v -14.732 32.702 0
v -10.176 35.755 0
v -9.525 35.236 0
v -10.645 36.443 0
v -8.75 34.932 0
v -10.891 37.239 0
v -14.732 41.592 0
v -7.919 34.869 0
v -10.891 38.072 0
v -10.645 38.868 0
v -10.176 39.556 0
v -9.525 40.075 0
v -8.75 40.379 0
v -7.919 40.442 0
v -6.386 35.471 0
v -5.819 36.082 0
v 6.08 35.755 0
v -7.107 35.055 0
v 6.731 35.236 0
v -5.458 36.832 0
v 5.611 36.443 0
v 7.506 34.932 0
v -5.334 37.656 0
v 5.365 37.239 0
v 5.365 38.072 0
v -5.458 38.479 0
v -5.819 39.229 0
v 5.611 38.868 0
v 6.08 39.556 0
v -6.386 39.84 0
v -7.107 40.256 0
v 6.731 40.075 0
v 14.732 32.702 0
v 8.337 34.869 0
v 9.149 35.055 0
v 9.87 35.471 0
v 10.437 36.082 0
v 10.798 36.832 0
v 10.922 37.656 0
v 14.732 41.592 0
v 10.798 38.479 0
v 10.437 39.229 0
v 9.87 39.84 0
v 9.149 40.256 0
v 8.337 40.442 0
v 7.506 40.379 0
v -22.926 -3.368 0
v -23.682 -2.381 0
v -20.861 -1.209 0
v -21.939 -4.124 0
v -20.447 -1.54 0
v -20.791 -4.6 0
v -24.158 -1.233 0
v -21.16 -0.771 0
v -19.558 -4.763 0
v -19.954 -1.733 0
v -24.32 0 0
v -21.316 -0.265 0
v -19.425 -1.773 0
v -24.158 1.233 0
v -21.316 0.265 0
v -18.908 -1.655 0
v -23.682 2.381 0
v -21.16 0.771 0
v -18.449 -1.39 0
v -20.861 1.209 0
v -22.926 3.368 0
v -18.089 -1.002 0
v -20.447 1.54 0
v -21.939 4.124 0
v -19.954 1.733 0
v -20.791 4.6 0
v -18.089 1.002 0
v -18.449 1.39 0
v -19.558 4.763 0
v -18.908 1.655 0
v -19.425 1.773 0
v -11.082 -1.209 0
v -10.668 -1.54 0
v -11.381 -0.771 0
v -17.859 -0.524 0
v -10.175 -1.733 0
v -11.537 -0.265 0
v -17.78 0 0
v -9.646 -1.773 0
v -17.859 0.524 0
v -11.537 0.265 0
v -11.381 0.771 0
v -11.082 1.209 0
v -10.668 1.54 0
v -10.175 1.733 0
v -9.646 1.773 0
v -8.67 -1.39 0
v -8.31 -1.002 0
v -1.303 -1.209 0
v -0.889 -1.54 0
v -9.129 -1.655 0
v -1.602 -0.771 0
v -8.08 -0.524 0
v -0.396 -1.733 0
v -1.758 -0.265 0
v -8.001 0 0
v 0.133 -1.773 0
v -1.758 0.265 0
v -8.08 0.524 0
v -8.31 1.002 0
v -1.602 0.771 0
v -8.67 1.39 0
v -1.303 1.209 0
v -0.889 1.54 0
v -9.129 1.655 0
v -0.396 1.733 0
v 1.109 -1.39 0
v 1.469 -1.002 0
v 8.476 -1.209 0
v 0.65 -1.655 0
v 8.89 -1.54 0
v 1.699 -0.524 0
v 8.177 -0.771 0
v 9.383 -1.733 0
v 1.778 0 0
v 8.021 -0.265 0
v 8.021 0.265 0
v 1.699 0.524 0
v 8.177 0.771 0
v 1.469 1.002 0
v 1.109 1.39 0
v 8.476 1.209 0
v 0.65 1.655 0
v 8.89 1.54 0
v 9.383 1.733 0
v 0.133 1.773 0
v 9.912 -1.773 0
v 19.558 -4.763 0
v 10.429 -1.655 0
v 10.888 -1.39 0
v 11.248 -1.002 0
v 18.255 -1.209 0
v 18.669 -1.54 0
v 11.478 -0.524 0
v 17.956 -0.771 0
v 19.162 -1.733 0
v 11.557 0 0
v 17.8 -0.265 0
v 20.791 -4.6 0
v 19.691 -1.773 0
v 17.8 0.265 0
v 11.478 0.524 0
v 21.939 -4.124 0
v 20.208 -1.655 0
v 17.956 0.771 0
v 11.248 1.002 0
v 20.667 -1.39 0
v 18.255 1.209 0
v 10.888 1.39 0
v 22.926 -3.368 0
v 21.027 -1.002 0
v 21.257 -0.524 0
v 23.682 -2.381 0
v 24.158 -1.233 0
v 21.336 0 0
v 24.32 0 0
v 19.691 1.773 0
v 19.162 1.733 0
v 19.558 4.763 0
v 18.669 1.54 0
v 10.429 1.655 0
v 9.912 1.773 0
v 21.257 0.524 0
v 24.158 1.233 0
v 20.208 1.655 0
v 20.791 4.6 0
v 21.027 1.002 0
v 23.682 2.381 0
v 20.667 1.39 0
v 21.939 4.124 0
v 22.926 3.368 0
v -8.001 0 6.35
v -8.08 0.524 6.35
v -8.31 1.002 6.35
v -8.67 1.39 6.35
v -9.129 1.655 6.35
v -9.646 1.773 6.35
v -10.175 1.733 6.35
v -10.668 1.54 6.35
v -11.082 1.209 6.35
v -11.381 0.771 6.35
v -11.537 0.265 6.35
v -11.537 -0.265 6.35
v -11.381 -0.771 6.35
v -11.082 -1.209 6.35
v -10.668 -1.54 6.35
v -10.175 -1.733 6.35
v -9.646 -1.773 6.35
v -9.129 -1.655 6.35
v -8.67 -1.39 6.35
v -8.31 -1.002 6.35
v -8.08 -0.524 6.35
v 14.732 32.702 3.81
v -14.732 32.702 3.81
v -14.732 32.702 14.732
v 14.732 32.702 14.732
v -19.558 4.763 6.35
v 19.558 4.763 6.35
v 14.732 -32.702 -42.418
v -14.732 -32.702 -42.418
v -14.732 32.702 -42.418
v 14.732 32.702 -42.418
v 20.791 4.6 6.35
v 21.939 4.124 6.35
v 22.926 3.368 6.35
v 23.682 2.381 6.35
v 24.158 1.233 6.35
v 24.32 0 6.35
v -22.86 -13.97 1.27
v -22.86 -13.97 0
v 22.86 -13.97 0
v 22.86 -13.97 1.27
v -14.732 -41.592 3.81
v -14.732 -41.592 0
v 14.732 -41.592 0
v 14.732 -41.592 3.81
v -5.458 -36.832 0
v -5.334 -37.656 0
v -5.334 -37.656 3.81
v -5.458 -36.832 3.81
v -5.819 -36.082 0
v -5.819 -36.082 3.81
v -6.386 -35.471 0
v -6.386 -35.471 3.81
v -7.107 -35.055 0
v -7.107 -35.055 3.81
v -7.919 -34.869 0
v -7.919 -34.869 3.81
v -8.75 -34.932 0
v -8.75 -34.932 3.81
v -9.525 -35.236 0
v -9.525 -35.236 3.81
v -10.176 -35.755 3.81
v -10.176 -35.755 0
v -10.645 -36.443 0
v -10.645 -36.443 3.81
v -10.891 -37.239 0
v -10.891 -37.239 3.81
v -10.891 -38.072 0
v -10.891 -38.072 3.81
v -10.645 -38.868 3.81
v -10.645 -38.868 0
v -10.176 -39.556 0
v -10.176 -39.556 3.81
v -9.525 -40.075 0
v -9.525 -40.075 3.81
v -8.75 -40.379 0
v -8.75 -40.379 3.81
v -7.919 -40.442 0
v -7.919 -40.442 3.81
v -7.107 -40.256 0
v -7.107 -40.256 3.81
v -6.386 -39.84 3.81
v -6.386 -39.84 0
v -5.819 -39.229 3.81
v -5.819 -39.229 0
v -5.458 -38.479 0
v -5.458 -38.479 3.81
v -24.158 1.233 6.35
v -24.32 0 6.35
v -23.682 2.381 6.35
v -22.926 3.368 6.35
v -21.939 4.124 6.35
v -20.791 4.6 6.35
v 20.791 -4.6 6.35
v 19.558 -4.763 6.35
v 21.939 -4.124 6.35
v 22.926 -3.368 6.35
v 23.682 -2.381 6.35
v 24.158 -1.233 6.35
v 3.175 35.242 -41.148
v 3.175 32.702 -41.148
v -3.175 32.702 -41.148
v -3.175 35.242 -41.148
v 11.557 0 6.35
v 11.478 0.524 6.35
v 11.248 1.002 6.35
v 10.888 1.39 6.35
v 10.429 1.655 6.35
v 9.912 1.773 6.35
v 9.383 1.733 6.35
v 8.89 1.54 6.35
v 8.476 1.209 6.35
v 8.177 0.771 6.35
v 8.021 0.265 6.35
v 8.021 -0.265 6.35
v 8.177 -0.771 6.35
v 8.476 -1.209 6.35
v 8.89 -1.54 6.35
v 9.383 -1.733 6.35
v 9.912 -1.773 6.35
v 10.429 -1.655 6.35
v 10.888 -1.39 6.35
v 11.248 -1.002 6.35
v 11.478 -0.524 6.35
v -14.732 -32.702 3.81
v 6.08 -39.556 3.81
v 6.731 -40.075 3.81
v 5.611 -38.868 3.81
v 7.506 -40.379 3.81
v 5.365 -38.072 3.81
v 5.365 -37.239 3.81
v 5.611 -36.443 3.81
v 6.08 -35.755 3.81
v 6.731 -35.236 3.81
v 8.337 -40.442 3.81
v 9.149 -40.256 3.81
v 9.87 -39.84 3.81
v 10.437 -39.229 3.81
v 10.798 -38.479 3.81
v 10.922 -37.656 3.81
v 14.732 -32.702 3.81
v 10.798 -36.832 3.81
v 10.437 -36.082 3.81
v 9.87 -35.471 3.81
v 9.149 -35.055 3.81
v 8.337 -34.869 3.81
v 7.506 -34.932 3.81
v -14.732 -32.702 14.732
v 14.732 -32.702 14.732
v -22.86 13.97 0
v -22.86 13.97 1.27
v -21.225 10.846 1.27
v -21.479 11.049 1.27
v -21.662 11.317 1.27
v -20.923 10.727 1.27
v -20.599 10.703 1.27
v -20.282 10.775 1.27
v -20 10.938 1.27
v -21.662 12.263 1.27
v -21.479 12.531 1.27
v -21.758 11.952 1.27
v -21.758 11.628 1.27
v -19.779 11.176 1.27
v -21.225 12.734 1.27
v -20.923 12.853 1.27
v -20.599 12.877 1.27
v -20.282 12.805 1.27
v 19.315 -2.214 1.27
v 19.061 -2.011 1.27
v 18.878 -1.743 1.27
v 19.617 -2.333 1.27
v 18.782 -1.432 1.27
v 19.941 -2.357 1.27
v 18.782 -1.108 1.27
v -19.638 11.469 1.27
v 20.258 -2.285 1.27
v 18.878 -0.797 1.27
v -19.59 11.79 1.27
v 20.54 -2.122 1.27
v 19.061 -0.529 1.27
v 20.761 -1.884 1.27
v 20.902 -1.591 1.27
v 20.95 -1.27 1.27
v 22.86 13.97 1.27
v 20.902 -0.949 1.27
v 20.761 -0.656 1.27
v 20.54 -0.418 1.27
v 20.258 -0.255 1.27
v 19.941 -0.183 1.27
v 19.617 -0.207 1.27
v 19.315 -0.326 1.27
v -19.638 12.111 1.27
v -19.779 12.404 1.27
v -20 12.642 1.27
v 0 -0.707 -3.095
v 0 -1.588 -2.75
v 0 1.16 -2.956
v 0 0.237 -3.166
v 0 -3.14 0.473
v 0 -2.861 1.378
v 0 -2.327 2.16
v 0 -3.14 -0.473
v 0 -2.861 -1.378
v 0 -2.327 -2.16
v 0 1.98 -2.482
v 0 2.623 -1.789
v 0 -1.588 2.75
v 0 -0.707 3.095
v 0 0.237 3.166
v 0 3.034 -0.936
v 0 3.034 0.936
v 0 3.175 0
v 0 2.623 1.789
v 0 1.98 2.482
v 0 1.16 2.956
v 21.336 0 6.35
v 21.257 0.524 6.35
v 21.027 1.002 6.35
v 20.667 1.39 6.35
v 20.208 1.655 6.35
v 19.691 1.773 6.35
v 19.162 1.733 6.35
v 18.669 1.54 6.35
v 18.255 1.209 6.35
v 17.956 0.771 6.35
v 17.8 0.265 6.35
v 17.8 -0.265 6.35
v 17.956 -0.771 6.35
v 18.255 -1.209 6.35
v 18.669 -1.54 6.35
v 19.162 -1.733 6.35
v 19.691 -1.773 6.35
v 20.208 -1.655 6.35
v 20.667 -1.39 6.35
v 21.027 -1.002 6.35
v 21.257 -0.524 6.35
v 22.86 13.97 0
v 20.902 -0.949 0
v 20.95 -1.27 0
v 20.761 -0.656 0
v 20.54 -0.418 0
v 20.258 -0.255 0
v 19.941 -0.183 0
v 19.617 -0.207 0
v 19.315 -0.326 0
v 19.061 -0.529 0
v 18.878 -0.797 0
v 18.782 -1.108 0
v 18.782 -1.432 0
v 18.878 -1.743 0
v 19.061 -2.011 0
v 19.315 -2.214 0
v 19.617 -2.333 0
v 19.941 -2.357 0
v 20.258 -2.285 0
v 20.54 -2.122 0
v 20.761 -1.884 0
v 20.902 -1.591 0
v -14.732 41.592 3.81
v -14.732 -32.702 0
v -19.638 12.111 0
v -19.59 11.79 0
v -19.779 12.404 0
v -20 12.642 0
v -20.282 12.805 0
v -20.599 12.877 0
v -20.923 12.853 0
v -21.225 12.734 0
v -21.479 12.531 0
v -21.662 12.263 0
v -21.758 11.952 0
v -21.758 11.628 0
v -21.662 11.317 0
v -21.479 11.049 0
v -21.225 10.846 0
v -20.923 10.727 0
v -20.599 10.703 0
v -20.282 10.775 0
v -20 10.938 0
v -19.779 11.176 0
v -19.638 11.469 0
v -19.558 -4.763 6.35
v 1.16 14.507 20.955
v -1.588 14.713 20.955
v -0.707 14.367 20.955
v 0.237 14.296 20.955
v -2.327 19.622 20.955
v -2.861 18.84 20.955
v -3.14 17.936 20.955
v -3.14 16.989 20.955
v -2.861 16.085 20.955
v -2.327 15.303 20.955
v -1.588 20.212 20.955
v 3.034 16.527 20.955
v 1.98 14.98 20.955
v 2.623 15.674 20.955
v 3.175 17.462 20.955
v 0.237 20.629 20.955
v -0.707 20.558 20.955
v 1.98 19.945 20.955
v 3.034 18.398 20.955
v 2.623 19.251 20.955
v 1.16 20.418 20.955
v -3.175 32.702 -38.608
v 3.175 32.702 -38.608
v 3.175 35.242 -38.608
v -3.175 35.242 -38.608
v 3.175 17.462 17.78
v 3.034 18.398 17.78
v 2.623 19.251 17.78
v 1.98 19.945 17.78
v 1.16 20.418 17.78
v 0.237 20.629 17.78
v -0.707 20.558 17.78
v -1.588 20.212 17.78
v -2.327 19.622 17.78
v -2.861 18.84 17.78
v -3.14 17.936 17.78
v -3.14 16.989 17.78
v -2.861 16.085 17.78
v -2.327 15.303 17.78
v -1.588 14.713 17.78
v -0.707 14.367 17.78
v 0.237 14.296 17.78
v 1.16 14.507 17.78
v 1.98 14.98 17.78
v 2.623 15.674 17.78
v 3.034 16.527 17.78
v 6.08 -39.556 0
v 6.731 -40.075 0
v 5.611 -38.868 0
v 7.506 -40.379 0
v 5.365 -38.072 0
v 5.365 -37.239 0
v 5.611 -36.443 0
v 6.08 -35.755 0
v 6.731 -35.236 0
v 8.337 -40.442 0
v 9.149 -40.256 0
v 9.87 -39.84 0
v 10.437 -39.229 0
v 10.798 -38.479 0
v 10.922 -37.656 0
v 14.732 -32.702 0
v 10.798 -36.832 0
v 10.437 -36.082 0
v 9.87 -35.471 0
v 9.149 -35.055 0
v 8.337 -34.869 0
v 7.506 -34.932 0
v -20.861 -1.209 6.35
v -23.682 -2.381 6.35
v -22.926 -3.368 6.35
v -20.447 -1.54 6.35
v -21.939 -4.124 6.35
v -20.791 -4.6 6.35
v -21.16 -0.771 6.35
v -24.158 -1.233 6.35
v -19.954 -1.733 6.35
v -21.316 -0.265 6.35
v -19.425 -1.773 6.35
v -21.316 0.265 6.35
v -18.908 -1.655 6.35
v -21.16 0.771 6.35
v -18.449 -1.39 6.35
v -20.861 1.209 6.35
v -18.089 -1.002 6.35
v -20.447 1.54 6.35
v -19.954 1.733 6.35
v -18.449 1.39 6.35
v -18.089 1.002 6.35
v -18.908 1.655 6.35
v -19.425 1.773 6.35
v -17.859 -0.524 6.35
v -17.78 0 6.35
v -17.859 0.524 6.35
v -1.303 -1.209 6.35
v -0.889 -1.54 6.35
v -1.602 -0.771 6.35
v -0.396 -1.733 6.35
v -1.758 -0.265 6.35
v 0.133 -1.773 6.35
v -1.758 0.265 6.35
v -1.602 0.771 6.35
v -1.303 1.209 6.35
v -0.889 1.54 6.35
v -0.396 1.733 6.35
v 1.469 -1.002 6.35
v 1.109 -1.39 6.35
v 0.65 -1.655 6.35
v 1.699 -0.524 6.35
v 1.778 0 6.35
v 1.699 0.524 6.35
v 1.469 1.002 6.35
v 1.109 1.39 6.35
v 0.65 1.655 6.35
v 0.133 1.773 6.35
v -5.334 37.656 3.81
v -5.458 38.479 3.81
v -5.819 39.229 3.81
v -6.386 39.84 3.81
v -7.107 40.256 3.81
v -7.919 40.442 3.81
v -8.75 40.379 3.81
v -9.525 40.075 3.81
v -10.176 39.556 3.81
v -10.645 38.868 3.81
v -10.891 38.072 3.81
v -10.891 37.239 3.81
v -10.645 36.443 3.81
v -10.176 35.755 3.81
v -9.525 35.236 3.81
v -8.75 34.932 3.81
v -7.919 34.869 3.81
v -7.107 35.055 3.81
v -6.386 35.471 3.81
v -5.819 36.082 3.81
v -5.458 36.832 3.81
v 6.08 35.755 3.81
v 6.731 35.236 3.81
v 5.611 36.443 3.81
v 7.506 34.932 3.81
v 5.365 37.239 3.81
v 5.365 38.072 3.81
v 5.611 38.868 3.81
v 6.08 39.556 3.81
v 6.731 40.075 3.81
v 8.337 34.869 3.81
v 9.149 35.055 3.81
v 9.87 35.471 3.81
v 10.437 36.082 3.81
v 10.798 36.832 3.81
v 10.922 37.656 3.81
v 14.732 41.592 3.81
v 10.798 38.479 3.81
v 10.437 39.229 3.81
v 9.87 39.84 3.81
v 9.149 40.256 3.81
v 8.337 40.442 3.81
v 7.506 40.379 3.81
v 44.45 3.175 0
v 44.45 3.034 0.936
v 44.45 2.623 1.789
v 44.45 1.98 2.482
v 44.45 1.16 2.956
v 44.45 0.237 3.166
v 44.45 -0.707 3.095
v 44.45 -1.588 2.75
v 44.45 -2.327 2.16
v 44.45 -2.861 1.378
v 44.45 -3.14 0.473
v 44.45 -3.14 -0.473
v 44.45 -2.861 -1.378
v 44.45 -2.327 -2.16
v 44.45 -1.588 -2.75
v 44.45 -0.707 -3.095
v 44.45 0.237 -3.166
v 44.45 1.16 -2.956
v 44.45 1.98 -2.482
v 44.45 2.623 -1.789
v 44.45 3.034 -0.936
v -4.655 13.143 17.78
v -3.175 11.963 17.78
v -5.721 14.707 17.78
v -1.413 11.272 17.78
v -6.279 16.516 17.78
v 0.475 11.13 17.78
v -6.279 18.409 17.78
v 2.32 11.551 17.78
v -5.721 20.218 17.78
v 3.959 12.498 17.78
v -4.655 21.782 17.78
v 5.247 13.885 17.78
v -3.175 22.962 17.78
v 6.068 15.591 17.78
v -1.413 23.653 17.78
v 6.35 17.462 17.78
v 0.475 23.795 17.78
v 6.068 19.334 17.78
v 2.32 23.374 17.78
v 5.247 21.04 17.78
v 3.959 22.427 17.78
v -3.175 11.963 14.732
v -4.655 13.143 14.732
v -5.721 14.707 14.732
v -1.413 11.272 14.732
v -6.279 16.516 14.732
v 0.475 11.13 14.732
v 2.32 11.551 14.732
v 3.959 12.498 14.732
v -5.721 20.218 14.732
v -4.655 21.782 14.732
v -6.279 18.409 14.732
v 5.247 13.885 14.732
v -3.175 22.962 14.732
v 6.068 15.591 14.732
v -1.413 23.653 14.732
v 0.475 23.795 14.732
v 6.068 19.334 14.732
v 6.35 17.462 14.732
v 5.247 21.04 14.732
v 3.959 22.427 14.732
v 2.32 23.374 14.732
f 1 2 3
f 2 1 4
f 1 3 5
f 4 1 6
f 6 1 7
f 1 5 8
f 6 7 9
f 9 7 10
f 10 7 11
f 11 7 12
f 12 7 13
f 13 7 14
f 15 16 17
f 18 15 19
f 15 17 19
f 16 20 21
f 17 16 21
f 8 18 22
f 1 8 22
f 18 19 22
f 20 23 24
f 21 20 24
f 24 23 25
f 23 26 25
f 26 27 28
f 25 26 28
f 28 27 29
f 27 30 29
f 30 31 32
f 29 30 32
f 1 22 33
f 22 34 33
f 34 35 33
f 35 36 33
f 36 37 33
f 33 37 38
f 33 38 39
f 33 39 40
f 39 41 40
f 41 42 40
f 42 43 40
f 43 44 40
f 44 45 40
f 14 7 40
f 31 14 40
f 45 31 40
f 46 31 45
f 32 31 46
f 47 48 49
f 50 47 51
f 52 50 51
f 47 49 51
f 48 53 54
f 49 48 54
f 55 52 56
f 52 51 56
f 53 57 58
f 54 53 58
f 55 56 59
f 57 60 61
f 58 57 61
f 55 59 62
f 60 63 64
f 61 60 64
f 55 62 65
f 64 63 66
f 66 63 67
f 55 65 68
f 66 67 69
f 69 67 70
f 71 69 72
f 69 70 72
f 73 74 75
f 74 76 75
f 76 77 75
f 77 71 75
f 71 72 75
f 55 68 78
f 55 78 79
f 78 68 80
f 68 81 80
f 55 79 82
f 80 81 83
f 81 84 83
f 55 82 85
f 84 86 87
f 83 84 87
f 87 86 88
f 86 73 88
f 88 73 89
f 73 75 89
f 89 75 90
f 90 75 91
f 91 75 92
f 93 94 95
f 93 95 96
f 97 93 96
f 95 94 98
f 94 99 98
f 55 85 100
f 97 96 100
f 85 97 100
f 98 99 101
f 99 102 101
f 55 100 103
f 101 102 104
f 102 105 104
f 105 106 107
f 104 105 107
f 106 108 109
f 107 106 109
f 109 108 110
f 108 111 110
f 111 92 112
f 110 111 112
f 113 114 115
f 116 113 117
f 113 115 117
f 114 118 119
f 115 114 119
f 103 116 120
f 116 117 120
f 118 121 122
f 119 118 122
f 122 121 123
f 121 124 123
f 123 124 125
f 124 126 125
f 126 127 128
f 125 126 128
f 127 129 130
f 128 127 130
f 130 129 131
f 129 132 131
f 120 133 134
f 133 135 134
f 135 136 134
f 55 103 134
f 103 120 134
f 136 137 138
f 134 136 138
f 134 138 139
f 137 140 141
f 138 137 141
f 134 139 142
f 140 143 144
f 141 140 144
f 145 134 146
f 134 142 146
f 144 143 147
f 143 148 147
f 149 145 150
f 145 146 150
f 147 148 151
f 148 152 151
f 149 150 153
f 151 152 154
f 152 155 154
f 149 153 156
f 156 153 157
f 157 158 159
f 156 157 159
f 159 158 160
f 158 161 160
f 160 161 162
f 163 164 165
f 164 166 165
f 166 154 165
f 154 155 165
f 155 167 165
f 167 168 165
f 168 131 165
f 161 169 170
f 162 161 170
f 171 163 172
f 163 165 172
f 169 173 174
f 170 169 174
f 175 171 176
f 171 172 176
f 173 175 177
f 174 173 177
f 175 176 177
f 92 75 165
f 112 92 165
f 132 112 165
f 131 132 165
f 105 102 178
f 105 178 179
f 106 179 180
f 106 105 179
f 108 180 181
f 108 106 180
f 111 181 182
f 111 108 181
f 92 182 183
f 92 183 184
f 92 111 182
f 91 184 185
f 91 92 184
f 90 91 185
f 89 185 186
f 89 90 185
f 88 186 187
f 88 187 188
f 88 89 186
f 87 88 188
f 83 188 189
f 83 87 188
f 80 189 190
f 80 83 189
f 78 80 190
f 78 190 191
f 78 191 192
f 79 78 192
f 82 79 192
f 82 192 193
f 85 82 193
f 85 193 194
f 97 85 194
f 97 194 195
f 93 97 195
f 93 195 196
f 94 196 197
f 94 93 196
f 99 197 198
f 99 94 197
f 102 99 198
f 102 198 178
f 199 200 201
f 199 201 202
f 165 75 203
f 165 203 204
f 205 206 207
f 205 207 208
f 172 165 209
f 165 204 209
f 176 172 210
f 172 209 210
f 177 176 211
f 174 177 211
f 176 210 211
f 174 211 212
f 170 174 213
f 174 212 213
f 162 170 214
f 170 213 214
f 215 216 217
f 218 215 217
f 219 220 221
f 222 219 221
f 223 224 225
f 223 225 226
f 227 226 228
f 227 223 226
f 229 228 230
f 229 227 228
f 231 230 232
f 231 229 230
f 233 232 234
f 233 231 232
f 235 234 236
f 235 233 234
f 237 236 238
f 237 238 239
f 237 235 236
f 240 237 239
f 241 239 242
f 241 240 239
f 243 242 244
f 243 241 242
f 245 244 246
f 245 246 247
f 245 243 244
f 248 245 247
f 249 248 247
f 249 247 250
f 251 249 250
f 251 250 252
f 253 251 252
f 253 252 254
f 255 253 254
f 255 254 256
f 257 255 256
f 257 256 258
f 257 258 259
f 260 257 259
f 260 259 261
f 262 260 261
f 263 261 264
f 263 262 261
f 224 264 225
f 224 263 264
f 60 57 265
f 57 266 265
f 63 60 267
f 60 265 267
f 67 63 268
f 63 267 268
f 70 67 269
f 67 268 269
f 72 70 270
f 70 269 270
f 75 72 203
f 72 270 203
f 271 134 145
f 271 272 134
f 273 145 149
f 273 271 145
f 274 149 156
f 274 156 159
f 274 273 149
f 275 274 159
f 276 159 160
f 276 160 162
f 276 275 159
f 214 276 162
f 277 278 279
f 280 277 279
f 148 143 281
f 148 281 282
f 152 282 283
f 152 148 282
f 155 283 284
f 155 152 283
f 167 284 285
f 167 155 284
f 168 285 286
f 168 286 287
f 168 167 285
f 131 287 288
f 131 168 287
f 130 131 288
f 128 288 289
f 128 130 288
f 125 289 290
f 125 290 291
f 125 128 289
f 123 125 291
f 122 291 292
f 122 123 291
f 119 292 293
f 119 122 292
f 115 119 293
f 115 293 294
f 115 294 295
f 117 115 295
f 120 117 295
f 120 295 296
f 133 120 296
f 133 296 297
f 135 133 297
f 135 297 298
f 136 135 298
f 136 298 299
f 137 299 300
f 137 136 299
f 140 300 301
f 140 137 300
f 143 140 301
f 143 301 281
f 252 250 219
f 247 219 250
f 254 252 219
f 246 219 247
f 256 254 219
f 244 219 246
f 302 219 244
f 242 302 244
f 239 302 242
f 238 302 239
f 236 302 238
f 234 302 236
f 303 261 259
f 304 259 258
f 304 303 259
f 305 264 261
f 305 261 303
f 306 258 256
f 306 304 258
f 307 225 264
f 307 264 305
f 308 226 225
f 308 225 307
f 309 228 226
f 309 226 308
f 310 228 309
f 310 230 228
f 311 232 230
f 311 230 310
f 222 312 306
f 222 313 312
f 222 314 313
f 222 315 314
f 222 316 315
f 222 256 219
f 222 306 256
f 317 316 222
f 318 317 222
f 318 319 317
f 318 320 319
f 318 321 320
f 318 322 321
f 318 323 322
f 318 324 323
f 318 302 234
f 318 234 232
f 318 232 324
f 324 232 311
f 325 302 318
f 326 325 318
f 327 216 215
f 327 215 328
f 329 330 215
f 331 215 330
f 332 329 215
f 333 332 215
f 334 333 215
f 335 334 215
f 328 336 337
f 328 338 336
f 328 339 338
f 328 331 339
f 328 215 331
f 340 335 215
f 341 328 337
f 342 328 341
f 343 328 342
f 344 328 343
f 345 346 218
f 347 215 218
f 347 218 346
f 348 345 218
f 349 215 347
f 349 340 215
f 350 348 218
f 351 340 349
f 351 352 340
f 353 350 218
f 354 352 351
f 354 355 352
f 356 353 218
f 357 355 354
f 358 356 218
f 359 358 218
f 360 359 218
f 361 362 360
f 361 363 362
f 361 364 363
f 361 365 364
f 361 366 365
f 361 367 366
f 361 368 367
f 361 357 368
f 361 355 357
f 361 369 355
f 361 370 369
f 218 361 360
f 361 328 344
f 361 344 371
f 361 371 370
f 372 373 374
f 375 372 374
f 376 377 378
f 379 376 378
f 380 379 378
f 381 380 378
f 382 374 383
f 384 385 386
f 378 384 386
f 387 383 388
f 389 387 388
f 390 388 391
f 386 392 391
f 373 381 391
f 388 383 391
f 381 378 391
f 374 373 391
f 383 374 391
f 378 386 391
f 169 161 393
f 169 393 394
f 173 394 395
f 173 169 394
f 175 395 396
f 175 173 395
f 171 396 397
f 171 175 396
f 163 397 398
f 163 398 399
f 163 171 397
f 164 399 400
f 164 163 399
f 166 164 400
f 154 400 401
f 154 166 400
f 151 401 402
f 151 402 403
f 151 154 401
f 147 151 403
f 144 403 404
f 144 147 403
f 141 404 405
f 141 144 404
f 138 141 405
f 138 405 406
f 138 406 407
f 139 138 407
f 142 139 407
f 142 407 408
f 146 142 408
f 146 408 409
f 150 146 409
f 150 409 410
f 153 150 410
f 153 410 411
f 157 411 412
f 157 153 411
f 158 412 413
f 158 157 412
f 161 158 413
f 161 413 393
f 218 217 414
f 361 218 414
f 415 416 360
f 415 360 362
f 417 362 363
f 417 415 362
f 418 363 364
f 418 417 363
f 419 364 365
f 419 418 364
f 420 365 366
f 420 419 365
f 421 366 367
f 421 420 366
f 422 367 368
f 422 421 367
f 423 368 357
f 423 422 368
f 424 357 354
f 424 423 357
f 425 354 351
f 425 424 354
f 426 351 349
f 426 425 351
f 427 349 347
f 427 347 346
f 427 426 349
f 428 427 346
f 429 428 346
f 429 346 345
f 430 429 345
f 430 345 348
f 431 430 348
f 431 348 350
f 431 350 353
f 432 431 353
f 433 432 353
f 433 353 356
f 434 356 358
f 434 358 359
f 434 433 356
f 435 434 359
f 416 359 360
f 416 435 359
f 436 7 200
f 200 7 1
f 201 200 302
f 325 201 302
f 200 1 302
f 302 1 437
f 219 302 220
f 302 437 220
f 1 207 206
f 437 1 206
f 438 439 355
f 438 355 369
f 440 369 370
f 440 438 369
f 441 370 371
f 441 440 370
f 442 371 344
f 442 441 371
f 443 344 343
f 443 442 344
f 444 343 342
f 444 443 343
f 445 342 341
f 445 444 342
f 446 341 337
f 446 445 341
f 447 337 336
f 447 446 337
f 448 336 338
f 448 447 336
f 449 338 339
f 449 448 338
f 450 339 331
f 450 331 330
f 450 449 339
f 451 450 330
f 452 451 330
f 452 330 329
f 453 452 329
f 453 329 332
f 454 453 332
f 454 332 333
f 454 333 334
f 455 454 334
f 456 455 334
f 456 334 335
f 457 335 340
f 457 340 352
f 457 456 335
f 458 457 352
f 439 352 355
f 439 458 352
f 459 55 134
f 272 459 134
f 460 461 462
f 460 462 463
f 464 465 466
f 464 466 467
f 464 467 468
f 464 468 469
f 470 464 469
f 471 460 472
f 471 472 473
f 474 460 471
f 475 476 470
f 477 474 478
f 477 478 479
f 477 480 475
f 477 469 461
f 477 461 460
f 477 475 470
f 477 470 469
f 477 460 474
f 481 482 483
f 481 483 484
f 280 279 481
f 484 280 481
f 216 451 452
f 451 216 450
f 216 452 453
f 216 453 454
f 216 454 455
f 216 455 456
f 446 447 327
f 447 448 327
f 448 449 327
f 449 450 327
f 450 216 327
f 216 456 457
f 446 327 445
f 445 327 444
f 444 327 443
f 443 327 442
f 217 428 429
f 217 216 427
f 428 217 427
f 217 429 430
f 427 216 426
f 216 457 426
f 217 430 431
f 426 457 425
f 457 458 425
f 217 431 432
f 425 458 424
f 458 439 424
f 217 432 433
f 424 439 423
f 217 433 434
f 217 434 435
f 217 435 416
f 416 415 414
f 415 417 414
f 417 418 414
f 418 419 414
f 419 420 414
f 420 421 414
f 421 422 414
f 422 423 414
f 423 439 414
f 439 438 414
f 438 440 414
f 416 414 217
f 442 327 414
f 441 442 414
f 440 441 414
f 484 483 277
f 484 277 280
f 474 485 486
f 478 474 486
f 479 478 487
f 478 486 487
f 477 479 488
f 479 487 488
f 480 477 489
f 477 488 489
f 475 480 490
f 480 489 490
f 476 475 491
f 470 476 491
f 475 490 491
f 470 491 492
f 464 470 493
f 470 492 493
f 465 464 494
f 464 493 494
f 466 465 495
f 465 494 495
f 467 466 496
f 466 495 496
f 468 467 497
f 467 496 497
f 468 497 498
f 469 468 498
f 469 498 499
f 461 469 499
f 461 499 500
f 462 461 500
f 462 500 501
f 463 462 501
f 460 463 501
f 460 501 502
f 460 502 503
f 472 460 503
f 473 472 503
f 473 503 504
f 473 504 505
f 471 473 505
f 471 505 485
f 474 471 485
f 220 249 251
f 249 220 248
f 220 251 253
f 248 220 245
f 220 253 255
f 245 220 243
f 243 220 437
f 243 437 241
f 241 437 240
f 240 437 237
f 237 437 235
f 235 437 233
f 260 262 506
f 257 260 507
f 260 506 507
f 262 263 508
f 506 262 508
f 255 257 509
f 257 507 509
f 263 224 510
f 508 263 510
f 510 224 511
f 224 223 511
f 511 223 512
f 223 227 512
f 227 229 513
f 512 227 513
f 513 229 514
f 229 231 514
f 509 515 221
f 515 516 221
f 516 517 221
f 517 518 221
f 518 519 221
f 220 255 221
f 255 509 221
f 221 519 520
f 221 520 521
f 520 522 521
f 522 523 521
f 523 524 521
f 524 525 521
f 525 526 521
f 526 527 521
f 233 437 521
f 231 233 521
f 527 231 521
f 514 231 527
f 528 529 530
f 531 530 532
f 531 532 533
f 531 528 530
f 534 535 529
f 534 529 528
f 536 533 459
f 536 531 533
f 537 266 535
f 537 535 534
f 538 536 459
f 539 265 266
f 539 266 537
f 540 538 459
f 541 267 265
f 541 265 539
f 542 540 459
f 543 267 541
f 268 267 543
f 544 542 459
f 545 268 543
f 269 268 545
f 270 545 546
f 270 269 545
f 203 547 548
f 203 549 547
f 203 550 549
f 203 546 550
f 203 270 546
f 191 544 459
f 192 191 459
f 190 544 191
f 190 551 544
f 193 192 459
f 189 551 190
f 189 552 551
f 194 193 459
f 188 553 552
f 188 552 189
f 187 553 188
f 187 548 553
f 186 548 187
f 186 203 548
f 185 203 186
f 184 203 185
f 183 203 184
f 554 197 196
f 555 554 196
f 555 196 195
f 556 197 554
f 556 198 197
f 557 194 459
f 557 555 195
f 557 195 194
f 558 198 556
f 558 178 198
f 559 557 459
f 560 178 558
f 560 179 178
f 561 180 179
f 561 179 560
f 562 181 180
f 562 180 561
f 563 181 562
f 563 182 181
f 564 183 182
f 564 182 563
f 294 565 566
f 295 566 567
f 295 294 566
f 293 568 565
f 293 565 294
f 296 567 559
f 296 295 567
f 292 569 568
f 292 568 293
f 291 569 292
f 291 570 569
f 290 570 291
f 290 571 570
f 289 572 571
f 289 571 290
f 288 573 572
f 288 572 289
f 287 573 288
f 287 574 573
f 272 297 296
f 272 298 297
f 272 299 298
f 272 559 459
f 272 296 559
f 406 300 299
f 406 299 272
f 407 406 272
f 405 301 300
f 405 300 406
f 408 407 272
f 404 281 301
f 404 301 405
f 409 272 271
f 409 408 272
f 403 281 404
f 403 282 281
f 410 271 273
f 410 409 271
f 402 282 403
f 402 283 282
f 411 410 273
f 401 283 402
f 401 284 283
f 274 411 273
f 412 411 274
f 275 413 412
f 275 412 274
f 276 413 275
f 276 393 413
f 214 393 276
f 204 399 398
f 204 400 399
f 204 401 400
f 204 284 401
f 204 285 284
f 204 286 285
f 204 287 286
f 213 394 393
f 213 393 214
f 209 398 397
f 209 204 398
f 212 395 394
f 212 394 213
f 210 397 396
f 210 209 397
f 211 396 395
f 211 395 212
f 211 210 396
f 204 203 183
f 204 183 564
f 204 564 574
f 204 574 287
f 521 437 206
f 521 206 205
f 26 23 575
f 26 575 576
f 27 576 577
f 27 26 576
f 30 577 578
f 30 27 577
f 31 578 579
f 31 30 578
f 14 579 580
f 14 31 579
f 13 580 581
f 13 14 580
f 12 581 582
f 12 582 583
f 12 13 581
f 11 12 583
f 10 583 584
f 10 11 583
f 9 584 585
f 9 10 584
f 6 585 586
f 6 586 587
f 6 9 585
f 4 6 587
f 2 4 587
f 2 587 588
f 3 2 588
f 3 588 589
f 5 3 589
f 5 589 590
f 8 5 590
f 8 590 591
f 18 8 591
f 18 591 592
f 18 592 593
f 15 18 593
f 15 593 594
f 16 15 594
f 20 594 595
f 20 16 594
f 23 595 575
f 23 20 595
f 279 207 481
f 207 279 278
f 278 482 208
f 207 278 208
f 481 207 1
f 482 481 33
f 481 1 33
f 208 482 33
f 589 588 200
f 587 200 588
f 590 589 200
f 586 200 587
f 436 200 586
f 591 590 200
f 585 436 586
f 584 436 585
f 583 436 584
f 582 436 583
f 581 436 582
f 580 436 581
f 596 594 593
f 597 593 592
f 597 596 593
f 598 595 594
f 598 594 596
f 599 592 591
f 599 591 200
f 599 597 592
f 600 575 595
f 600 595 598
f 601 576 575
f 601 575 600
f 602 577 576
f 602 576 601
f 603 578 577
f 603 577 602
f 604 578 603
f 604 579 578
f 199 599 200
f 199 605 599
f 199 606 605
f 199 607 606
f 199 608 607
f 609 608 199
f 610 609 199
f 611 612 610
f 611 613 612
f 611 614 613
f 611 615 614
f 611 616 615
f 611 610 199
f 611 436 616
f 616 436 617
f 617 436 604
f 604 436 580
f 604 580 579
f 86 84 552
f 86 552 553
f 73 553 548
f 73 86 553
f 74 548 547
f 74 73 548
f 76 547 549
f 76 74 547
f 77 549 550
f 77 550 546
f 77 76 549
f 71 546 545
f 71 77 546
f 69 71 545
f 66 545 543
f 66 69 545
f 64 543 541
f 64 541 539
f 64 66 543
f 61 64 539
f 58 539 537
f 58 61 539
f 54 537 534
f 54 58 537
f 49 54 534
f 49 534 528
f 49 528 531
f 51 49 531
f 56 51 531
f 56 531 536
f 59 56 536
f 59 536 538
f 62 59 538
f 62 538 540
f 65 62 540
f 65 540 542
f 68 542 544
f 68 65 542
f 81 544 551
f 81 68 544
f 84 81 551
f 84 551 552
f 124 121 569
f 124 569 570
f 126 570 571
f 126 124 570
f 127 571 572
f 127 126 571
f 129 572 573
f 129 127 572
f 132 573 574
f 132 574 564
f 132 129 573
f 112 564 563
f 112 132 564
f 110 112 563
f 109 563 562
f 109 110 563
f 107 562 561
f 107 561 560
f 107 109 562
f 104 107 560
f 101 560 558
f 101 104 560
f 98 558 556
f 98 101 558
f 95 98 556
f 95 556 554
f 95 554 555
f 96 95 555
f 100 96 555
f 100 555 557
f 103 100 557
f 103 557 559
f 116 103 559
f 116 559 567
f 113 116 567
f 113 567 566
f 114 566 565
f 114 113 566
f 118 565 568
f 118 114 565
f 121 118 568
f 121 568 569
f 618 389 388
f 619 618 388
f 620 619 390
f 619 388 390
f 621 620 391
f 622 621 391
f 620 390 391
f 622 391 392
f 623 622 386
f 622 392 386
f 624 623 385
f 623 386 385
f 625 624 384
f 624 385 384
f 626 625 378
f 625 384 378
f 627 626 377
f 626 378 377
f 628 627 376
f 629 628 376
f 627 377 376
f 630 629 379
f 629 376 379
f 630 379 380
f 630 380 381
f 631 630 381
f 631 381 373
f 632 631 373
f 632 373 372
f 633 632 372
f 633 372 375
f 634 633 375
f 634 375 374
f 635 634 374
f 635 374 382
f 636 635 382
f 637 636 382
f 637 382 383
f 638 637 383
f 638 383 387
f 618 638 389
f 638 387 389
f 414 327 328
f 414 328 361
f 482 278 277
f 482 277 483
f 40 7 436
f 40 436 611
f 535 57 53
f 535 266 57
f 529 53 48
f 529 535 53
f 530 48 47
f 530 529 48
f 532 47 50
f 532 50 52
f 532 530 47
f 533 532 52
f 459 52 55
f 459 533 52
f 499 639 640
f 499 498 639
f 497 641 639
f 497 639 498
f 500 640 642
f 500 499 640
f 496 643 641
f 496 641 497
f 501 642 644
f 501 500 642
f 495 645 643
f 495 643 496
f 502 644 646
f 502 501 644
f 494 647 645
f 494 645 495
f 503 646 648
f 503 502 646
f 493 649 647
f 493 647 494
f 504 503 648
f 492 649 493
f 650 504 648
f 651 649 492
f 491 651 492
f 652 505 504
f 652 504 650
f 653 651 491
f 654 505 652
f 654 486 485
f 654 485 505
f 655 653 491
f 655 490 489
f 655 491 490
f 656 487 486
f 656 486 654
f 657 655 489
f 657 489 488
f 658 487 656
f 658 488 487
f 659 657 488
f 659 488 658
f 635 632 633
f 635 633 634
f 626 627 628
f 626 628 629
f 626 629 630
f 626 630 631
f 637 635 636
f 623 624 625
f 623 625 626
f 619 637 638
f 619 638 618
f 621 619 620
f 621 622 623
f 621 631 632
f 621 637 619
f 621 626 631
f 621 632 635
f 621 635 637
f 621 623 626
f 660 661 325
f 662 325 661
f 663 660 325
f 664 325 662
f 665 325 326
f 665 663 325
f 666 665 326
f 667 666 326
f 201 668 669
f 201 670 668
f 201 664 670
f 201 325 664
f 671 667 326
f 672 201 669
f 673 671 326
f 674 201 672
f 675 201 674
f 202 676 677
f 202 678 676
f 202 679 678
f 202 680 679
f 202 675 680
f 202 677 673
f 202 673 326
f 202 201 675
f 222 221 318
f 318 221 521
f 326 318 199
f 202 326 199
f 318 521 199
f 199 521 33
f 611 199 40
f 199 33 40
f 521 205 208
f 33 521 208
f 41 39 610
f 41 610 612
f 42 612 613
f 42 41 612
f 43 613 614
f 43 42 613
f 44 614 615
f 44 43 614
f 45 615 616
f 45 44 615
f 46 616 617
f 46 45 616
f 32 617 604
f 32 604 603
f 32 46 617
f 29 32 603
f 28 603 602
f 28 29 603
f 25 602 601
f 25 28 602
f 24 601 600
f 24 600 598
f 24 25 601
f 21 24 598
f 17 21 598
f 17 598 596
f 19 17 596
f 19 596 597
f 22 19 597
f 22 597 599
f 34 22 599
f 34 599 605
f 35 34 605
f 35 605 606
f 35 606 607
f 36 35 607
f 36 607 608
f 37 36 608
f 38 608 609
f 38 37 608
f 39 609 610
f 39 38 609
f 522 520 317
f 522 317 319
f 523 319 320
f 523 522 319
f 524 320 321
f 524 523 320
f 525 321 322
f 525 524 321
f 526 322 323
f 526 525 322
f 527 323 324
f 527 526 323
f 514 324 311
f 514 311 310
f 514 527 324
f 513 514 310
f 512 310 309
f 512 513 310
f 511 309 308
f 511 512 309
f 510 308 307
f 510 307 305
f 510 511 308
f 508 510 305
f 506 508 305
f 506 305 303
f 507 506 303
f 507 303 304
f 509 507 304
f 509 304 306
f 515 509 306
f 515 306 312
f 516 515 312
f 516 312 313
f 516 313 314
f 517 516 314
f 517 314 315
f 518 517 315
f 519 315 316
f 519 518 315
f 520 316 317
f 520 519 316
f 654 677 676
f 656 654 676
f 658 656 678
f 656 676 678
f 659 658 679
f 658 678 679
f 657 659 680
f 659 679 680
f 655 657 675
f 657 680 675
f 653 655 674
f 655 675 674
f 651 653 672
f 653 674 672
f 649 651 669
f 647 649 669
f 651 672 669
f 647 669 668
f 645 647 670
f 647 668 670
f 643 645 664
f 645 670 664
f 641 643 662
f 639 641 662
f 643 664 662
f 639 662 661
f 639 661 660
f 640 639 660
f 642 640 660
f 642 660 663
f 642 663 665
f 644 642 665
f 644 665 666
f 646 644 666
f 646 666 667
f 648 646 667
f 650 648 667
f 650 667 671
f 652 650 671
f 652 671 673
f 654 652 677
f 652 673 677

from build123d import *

# Parameters (mm, degrees)
F0_W      = 45.72
F0_H      = 27.94
F0_R      = 1.09
F1_DEPTH  = 1.27
F2_W      = 29.464
F2_H      = 8.89
F2_R      = 2.794
F2_H_2    = 65.405
F3_DEPTH  = 3.81
F4_DEPTH  = 14.732
F5_DEPTH  = 42.418
F6_R      = 3.175
F7_DEPTH  = 6.223
F6_R_2    = 6.35
F8_DEPTH  = 3.048
F9_W      = 6.35
F9_H      = 2.54
F10_DEPTH = 2.54
F11_R     = 3.175
F12_DEPTH = 44.45
F13_W     = 48.641
F13_H     = 9.525
F13_R     = 1.778
F14_DEPTH = 6.35
F15_R     = 4.76249


# Not quite as in the source:
# - a fillet or chamfer is up to 0.001 mm smaller than in the source, because OpenCascade refuses the exact size


with BuildPart() as f1:
    # F0 (on Top) → F1 (new body)
    with BuildSketch(Plane.XY):
        Rectangle(F0_W, F0_H)
        with Locations((19.86, -1.27)):
            Circle(F0_R, mode=Mode.SUBTRACT)
        with Locations((-20.68, 11.79)):
            Circle(F0_R, mode=Mode.SUBTRACT)
    extrude(amount=F1_DEPTH)


with BuildPart() as f3:
    # F2 (on Top) → F3 (new body)
    with BuildSketch(Plane.XY):
        with Locations((0, 37.1475)):
            Rectangle(F2_W, F2_H)
        with Locations((-8.128, 37.6555)):
            Circle(F2_R, mode=Mode.SUBTRACT)
        with Locations((8.128, 37.6555)):
            Circle(F2_R, mode=Mode.SUBTRACT)
        Rectangle(F2_W, F2_H_2)
        with Locations((0, -37.1475)):
            Rectangle(F2_W, F2_H)
        with Locations((-8.128, -37.6555)):
            Circle(F2_R, mode=Mode.SUBTRACT)
        with Locations((8.128, -37.6555)):
            Circle(F2_R, mode=Mode.SUBTRACT)
    extrude(amount=F3_DEPTH)

    # F2 (on Top) → F4 (join)
    with BuildSketch(Plane.XY):
        Rectangle(F2_W, F2_H_2)
    extrude(amount=F4_DEPTH)

    # F2 (on Top) → F5 (join)
    with BuildSketch(Plane.XY):
        Rectangle(F2_W, F2_H_2)
    extrude(amount=-F5_DEPTH)

    # F6 (on face) → F7 (join)
    with BuildSketch(Plane.XY.offset(14.732)):
        with Locations((0, 17.4625)):
            Circle(F6_R)
    extrude(amount=F7_DEPTH)

    # F6 (on face) → F8 (join)
    with BuildSketch(Plane.XY.offset(14.732)):
        with Locations((0, 17.4625)):
            Circle(F6_R_2)
        with Locations((0, 17.4625)):
            Circle(F6_R, mode=Mode.SUBTRACT)
    extrude(amount=F8_DEPTH)

    # F9 (on face) → F10 (join)
    with BuildSketch(Plane(origin=(0, 32.7025, 0), x_dir=(-1, 0, 0), z_dir=(0, 1, 0))):
        with Locations((0, -39.878)):
            Rectangle(F9_W, F9_H)
    extrude(amount=F10_DEPTH)


with BuildPart() as f12:
    # F11 (on Right) → F12 (new body)
    with BuildSketch(Plane.YZ):
        Circle(F11_R)
    extrude(amount=F12_DEPTH)


with BuildPart() as f14:
    # F13 (on Top) → F14 (new body)
    with BuildSketch(Plane.XY):
        Rectangle(F13_W, F13_H)
        with Locations((-19.558, 0)):
            Circle(F13_R, mode=Mode.SUBTRACT)
        with Locations((-9.779, 0)):
            Circle(F13_R, mode=Mode.SUBTRACT)
        Circle(F13_R, mode=Mode.SUBTRACT)
        with Locations((9.779, 0)):
            Circle(F13_R, mode=Mode.SUBTRACT)
        with Locations((19.558, 0)):
            Circle(F13_R, mode=Mode.SUBTRACT)
    extrude(amount=F14_DEPTH)

    # F15 (radius 4.7625 in the source; OpenCascade refuses exactly that, so slightly less here)
    f15_edges = [f14.edges().sort_by_distance(p)[0] for p in [
        (-24.3205, -4.7625, 3.175),
        (24.3205, -4.7625, 3.175),
        (24.3205, 4.7625, 3.175),
        (-24.3205, 4.7625, 3.175),
    ]]
    fillet(f15_edges, radius=F15_R)


solid = Compound([f1.part, f3.part, f12.part, f14.part])
